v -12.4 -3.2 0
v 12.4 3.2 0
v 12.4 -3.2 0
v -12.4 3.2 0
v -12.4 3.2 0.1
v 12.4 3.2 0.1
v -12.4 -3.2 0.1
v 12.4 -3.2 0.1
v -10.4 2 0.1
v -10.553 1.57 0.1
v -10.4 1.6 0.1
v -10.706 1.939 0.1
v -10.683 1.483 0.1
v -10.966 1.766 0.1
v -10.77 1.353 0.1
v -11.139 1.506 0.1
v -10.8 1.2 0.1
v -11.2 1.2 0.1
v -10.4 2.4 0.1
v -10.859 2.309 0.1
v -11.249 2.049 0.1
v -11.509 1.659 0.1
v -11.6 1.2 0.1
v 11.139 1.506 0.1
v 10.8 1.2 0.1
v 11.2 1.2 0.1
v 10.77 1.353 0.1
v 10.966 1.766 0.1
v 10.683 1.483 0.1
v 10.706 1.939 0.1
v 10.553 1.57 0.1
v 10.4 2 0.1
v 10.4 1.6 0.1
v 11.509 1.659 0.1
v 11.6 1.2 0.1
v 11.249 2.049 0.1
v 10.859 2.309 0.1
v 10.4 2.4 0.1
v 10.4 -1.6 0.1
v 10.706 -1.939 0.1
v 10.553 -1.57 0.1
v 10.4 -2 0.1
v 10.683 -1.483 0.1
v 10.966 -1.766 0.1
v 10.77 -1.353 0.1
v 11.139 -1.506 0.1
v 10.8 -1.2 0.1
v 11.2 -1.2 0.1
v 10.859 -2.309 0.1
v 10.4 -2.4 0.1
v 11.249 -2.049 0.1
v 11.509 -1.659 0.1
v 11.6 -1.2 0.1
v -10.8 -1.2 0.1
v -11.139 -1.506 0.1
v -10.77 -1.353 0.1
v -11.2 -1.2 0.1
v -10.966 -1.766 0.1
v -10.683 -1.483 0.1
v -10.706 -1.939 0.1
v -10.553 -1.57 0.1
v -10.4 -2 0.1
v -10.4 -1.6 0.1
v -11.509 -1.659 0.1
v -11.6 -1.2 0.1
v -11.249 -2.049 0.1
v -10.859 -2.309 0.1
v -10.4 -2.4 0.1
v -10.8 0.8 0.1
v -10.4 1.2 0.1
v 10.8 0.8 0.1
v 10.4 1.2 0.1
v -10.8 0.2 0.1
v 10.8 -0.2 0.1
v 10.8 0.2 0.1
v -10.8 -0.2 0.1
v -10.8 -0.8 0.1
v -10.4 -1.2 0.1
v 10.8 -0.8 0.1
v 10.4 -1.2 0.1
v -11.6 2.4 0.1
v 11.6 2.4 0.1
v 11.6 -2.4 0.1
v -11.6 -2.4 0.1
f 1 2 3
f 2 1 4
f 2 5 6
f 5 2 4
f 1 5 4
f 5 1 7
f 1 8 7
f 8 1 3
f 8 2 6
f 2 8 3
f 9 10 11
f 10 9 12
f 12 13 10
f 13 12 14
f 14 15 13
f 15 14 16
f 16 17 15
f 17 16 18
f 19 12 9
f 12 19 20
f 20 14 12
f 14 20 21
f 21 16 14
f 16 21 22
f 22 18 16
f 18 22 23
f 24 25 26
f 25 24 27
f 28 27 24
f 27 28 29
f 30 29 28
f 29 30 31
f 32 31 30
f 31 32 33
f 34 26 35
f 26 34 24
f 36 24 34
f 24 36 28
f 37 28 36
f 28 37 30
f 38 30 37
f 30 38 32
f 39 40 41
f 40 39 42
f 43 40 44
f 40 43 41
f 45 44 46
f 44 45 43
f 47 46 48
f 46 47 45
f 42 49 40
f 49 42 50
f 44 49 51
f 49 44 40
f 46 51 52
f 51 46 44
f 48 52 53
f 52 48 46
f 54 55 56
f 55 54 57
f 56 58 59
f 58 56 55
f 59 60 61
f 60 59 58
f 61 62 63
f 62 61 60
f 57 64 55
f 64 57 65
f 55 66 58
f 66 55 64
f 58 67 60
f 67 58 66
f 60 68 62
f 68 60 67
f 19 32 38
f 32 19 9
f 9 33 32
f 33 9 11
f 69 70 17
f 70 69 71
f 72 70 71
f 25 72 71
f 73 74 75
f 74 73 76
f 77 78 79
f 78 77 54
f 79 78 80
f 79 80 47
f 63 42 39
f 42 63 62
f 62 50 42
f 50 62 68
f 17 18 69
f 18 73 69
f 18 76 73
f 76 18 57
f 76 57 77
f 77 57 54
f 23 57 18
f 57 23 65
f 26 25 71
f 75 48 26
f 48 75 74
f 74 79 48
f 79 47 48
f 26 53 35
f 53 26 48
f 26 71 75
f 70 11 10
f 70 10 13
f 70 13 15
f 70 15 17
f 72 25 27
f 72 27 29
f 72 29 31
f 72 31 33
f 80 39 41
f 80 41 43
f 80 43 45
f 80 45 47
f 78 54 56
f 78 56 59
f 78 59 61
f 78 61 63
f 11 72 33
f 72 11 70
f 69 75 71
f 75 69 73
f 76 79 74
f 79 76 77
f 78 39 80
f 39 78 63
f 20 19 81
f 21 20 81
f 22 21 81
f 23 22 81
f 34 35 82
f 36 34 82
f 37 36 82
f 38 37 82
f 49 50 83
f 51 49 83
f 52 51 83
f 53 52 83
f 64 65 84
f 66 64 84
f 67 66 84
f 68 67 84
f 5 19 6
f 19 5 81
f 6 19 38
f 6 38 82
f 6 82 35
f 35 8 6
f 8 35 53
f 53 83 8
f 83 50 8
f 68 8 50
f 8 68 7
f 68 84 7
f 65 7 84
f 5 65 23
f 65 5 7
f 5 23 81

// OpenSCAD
// file: ../p/box5-12.scad
use <../lib.scad>
function ldraw_lib__box5_12() = [
// 0 Box with 5 Faces without Any Edges
// 0 Name: box5-12.dat
// 0 Author: Chris Dee [cwdee]
// 0 !LDRAW_ORG Primitive UPDATE 2009-02
// 0 !LICENSE Licensed under CC BY 2.0 and CC BY 4.0 : see CAreadme.txt
// 
// 0 BFC CERTIFY CCW
  [0,"BFC","CERTIFY"],
  [0,"BFC","CCW"],
// 
// 0 !HISTORY 2009-09-03 [PTadmin] Official Update 2009-02
// 
// 
// 4 16 1 1 1 1 1 -1 -1 1 -1 -1 1 1
  [4,16,1,1,1,1,1,-1,-1,1,-1,-1,1,1],
// 4 16 -1 0 1 1 0 1 1 1 1 -1 1 1
  [4,16,-1,0,1,1,0,1,1,1,1,-1,1,1],
// 4 16 -1 0 -1 -1 0 1 -1 1 1 -1 1 -1
  [4,16,-1,0,-1,-1,0,1,-1,1,1,-1,1,-1],
// 4 16 1 0 -1 -1 0 -1 -1 1 -1 1 1 -1
  [4,16,1,0,-1,-1,0,-1,-1,1,-1,1,1,-1],
// 4 16 1 0 1 1 0 -1 1 1 -1 1 1 1
  [4,16,1,0,1,1,0,-1,1,1,-1,1,1,1],
// 0
];
makepoly(ldraw_lib__box5_12(), line=0.2);
// file: ../p/1-4ring2.scad
use <../lib.scad>
function ldraw_lib__1_4ring2() = [
// 0 Ring  2 x 0.25
// 0 Name: 1-4ring2.dat
// 0 Author: Franklin W. Cain [fwcain]
// 0 !LDRAW_ORG Primitive UPDATE 2015-01
// 0 !LICENSE Licensed under CC BY 2.0 and CC BY 4.0 : see CAreadme.txt
// 
// 0 BFC CERTIFY CCW
  [0,"BFC","CERTIFY"],
  [0,"BFC","CCW"],
// 
// 0 !HISTORY 2001-12-31 [PTadmin] Official Update 2001-03
// 0 !HISTORY 2007-06-22 [PTadmin] Header formatted for Contributor Agreement
// 0 !HISTORY 2008-07-01 [PTadmin] Official Update 2008-01
// 0 !HISTORY 2012-02-16 [Philo] Changed to CCW
// 0 !HISTORY 2012-03-30 [PTadmin] Official Update 2012-01
// 0 !HISTORY 2014-12-25 [MMR1988] Fixed a rounding issue
// 0 !HISTORY 2015-10-11 [PTadmin] Official Update 2015-01
// 
// 
// 4 16 3 0 0 2.7717 0 1.1481 1.8478 0 0.7654 2 0 0
  [4,16,3,0,0,2.7717,0,1.1481,1.8478,0,0.7654,2,0,0],
// 4 16 2.7717 0 1.1481 2.1213 0 2.1213 1.4142 0 1.4142 1.8478 0 0.7654
  [4,16,2.7717,0,1.1481,2.1213,0,2.1213,1.4142,0,1.4142,1.8478,0,0.7654],
// 4 16 2.1213 0 2.1213 1.1481 0 2.7717 0.7654 0 1.8478 1.4142 0 1.4142
  [4,16,2.1213,0,2.1213,1.1481,0,2.7717,0.7654,0,1.8478,1.4142,0,1.4142],
// 4 16 1.1481 0 2.7717 0 0 3 0 0 2 0.7654 0 1.8478
  [4,16,1.1481,0,2.7717,0,0,3,0,0,2,0.7654,0,1.8478],
// 0 // Build by Primitive Generator 2
];
makepoly(ldraw_lib__1_4ring2(), line=0.2);
// file: ../p/1-4ring1.scad
use <../lib.scad>
function ldraw_lib__1_4ring1() = [
// 0 Ring  1 x 0.25
// 0 Name: 1-4ring1.dat
// 0 Author: Chris Dee [cwdee]
// 0 !LDRAW_ORG Primitive UPDATE 2012-01
// 0 !LICENSE Licensed under CC BY 2.0 and CC BY 4.0 : see CAreadme.txt
// 
// 0 BFC CERTIFY CCW
  [0,"BFC","CERTIFY"],
  [0,"BFC","CCW"],
// 
// 0 !HISTORY 2000-05-07 [PTadmin] Official Update 2000-01
// 0 !HISTORY 2002-11-22 [hafhead] Added BFC statement
// 0 !HISTORY 2002-11-30 [PTadmin] Official Update 2002-05
// 0 !HISTORY 2007-06-22 [PTadmin] Header formatted for Contributor Agreement
// 0 !HISTORY 2008-07-01 [PTadmin] Official Update 2008-01
// 0 !HISTORY 2012-02-16 [Philo] Changed to CCW
// 0 !HISTORY 2012-03-30 [PTadmin] Official Update 2012-01
// 
// 
// 4 16 2 0 0 1.8478 0 0.7654 0.9239 0 0.3827 1 0 0
  [4,16,2,0,0,1.8478,0,0.7654,0.9239,0,0.3827,1,0,0],
// 4 16 1.8478 0 0.7654 1.4142 0 1.4142 0.7071 0 0.7071 0.9239 0 0.3827
  [4,16,1.8478,0,0.7654,1.4142,0,1.4142,0.7071,0,0.7071,0.9239,0,0.3827],
// 4 16 1.4142 0 1.4142 0.7654 0 1.8478 0.3827 0 0.9239 0.7071 0 0.7071
  [4,16,1.4142,0,1.4142,0.7654,0,1.8478,0.3827,0,0.9239,0.7071,0,0.7071],
// 4 16 0.7654 0 1.8478 0 0 2 0 0 1 0.3827 0 0.9239
  [4,16,0.7654,0,1.8478,0,0,2,0,0,1,0.3827,0,0.9239],
];
makepoly(ldraw_lib__1_4ring1(), line=0.2);
// file: ../p/1-4ndis.scad
use <../lib.scad>
function ldraw_lib__1_4ndis() = [
// 0 Disc Negative 0.25
// 0 Name: 1-4ndis.dat
// 0 Author: James Jessiman
// 0 !LDRAW_ORG Primitive UPDATE 2012-01
// 0 !LICENSE Licensed under CC BY 2.0 and CC BY 4.0 : see CAreadme.txt
// 
// 0 BFC CERTIFY CCW
  [0,"BFC","CERTIFY"],
  [0,"BFC","CCW"],
// 
// 0 !HISTORY 2002-03-23 [sbliss] Added BFC Statement
// 0 !HISTORY 2002-04-25 [PTadmin] Official Update 2002-02
// 0 !HISTORY 2007-06-22 [PTadmin] Header formatted for Contributor Agreement
// 0 !HISTORY 2008-07-01 [PTadmin] Official Update 2008-01
// 0 !HISTORY 2012-02-16 [Philo] Changed to CCW
// 0 !HISTORY 2012-03-30 [PTadmin] Official Update 2012-01
// 
// 
// 3 16 0.9239 0 0.3827 1 0 0 1 0 1
  [3,16,0.9239,0,0.3827,1,0,0,1,0,1],
// 3 16 0.7071 0 0.7071 0.9239 0 0.3827 1 0 1
  [3,16,0.7071,0,0.7071,0.9239,0,0.3827,1,0,1],
// 3 16 0.3827 0 0.9239 0.7071 0 0.7071 1 0 1
  [3,16,0.3827,0,0.9239,0.7071,0,0.7071,1,0,1],
// 3 16 0 0 1 0.3827 0 0.9239 1 0 1
  [3,16,0,0,1,0.3827,0,0.9239,1,0,1],
];
makepoly(ldraw_lib__1_4ndis(), line=0.2);
// file: ../p/1-4disc.scad
use <../lib.scad>
function ldraw_lib__1_4disc() = [
// 0 Disc 0.25
// 0 Name: 1-4disc.dat
// 0 Author: James Jessiman
// 0 !LDRAW_ORG Primitive UPDATE 2002-02
// 0 !LICENSE Licensed under CC BY 2.0 and CC BY 4.0 : see CAreadme.txt
// 
// 0 BFC CERTIFY CCW
  [0,"BFC","CERTIFY"],
  [0,"BFC","CCW"],
// 
// 0 !HISTORY 2002-03-23 [sbliss] Added BFC statement.
// 0 !HISTORY 2002-04-25 [PTadmin] Official Update 2002-02
// 0 !HISTORY 2007-06-22 [PTadmin] Header formatted for Contributor Agreement
// 0 !HISTORY 2008-07-01 [PTadmin] Official Update 2008-01
// 
// 
// 3 16 0 0 0 1 0 0 0.9239 0 0.3827
  [3,16,0,0,0,1,0,0,0.9239,0,0.3827],
// 3 16 0 0 0 0.9239 0 0.3827 0.7071 0 0.7071
  [3,16,0,0,0,0.9239,0,0.3827,0.7071,0,0.7071],
// 3 16 0 0 0 0.7071 0 0.7071 0.3827 0 0.9239
  [3,16,0,0,0,0.7071,0,0.7071,0.3827,0,0.9239],
// 3 16 0 0 0 0.3827 0 0.9239 0 0 1
  [3,16,0,0,0,0.3827,0,0.9239,0,0,1],
// 0
];
makepoly(ldraw_lib__1_4disc(), line=0.2);
// main file
use <../lib.scad>
use <../p/1-4disc.scad>
use <../p/1-4ndis.scad>
use <../p/1-4ring1.scad>
use <../p/1-4ring2.scad>
use <../p/box5-12.scad>
function ldraw_lib__4100418f() = [
// 0 Sticker  0.8 x  3.1 with Horizontal Grille
// 0 Name: 4100418f.dat
// 0 Author: J.C. Tchang [tchang]
// 0 !LDRAW_ORG Part UPDATE 2013-01
// 0 !LICENSE Licensed under CC BY 2.0 and CC BY 4.0 : see CAreadme.txt
// 
// 0 BFC CERTIFY CCW
  [0,"BFC","CERTIFY"],
  [0,"BFC","CCW"],
// 
// 0 !KEYWORDS Set 5571
// 
// 0 !HISTORY 2013-07-21 [PTadmin] Official Update 2013-01
// 
// 
// 1 16 0 -0.25 0 31 0 0 0 0.25 0 0 0 8 box5-12.dat
  [1,16,0,-0.25,0,31,0,0,0,0.25,0,0,0,8, ldraw_lib__box5_12()],
// 0 //
// 1 0 -26 -0.25 3 0 0 -1 0 1 0 1 0 0 1-4ring1.dat
  [1,0,-26,-0.25,3,0,0,-1,0,1,0,1,0,0, ldraw_lib__1_4ring1()],
// 1 0 -26 -0.25 3 0 0 -1 0 1 0 1 0 0 1-4ring2.dat
  [1,0,-26,-0.25,3,0,0,-1,0,1,0,1,0,0, ldraw_lib__1_4ring2()],
// 1 0 26 -0.25 3 1 0 0 0 1 0 0 0 1 1-4ring1.dat
  [1,0,26,-0.25,3,1,0,0,0,1,0,0,0,1, ldraw_lib__1_4ring1()],
// 1 0 26 -0.25 3 1 0 0 0 1 0 0 0 1 1-4ring2.dat
  [1,0,26,-0.25,3,1,0,0,0,1,0,0,0,1, ldraw_lib__1_4ring2()],
// 1 0 26 -0.25 -3 0 0 1 0 1 0 -1 0 0 1-4ring1.dat
  [1,0,26,-0.25,-3,0,0,1,0,1,0,-1,0,0, ldraw_lib__1_4ring1()],
// 1 0 26 -0.25 -3 0 0 1 0 1 0 -1 0 0 1-4ring2.dat
  [1,0,26,-0.25,-3,0,0,1,0,1,0,-1,0,0, ldraw_lib__1_4ring2()],
// 1 0 -26 -0.25 -3 -1 0 0 0 1 0 0 0 -1 1-4ring1.dat
  [1,0,-26,-0.25,-3,-1,0,0,0,1,0,0,0,-1, ldraw_lib__1_4ring1()],
// 1 0 -26 -0.25 -3 -1 0 0 0 1 0 0 0 -1 1-4ring2.dat
  [1,0,-26,-0.25,-3,-1,0,0,0,1,0,0,0,-1, ldraw_lib__1_4ring2()],
// 4 0 26 -0.25 5 26 -0.25 6 -26 -0.25 6 -26 -0.25 5
  [4,0,26,-0.25,5,26,-0.25,6,-26,-0.25,6,-26,-0.25,5],
// 4 0 26 -0.25 4 26 -0.25 5 -26 -0.25 5 -26 -0.25 4
  [4,0,26,-0.25,4,26,-0.25,5,-26,-0.25,5,-26,-0.25,4],
// 4 0 -26 -0.25 3 -27 -0.25 3 -27 -0.25 2 27 -0.25 2
  [4,0,-26,-0.25,3,-27,-0.25,3,-27,-0.25,2,27,-0.25,2],
// 3 0 26 -0.25 3 -26 -0.25 3 27 -0.25 2
  [3,0,26,-0.25,3,-26,-0.25,3,27,-0.25,2],
// 3 0 27 -0.25 3 26 -0.25 3 27 -0.25 2
  [3,0,27,-0.25,3,26,-0.25,3,27,-0.25,2],
// 4 0 27 -0.25 0.5 -27 -0.25 0.5 -27 -0.25 -0.5 27 -0.25 -0.5
  [4,0,27,-0.25,0.5,-27,-0.25,0.5,-27,-0.25,-0.5,27,-0.25,-0.5],
// 4 0 -27 -0.25 -2 -27 -0.25 -3 -26 -0.25 -3 27 -0.25 -2
  [4,0,-27,-0.25,-2,-27,-0.25,-3,-26,-0.25,-3,27,-0.25,-2],
// 3 0 27 -0.25 -2 -26 -0.25 -3 26 -0.25 -3
  [3,0,27,-0.25,-2,-26,-0.25,-3,26,-0.25,-3],
// 3 0 27 -0.25 -2 26 -0.25 -3 27 -0.25 -3
  [3,0,27,-0.25,-2,26,-0.25,-3,27,-0.25,-3],
// 4 0 26 -0.25 -4 -26 -0.25 -4 -26 -0.25 -5 26 -0.25 -5
  [4,0,26,-0.25,-4,-26,-0.25,-4,-26,-0.25,-5,26,-0.25,-5],
// 4 0 26 -0.25 -5 -26 -0.25 -5 -26 -0.25 -6 26 -0.25 -6
  [4,0,26,-0.25,-5,-26,-0.25,-5,-26,-0.25,-6,26,-0.25,-6],
// 3 0 -27 -0.25 3 -28 -0.25 3 -27 -0.25 2
  [3,0,-27,-0.25,3,-28,-0.25,3,-27,-0.25,2],
// 3 0 -28 -0.25 3 -27 -0.25 0.5 -27 -0.25 2
  [3,0,-28,-0.25,3,-27,-0.25,0.5,-27,-0.25,2],
// 4 0 -27 -0.25 -0.5 -27 -0.25 0.5 -28 -0.25 3 -28 -0.25 -3
  [4,0,-27,-0.25,-0.5,-27,-0.25,0.5,-28,-0.25,3,-28,-0.25,-3],
// 3 0 -27 -0.25 -0.5 -28 -0.25 -3 -27 -0.25 -2
  [3,0,-27,-0.25,-0.5,-28,-0.25,-3,-27,-0.25,-2],
// 3 0 -27 -0.25 -2 -28 -0.25 -3 -27 -0.25 -3
  [3,0,-27,-0.25,-2,-28,-0.25,-3,-27,-0.25,-3],
// 4 0 -29 -0.25 -3 -28 -0.25 -3 -28 -0.25 3 -29 -0.25 3
  [4,0,-29,-0.25,-3,-28,-0.25,-3,-28,-0.25,3,-29,-0.25,3],
// 3 0 28 -0.25 3 27 -0.25 3 27 -0.25 2
  [3,0,28,-0.25,3,27,-0.25,3,27,-0.25,2],
// 4 0 28 -0.25 3 27 -0.25 0.5 27 -0.25 -0.5 28 -0.25 -3
  [4,0,28,-0.25,3,27,-0.25,0.5,27,-0.25,-0.5,28,-0.25,-3],
// 3 0 27 -0.25 -0.5 27 -0.25 -2 28 -0.25 -3
  [3,0,27,-0.25,-0.5,27,-0.25,-2,28,-0.25,-3],
// 3 0 27 -0.25 -2 27 -0.25 -3 28 -0.25 -3
  [3,0,27,-0.25,-2,27,-0.25,-3,28,-0.25,-3],
// 4 0 28 -0.25 3 28 -0.25 -3 29 -0.25 -3 29 -0.25 3
  [4,0,28,-0.25,3,28,-0.25,-3,29,-0.25,-3,29,-0.25,3],
// 3 0 28 -0.25 3 27 -0.25 2 27 -0.25 0.5
  [3,0,28,-0.25,3,27,-0.25,2,27,-0.25,0.5],
// 0 //
// 1 7 -26 -0.25 3 0 0 -1 0 1 0 1 0 0 1-4disc.dat
  [1,7,-26,-0.25,3,0,0,-1,0,1,0,1,0,0, ldraw_lib__1_4disc()],
// 1 7 26 -0.25 3 1 0 0 0 1 0 0 0 1 1-4disc.dat
  [1,7,26,-0.25,3,1,0,0,0,1,0,0,0,1, ldraw_lib__1_4disc()],
// 1 7 26 -0.25 -3 0 0 1 0 1 0 -1 0 0 1-4disc.dat
  [1,7,26,-0.25,-3,0,0,1,0,1,0,-1,0,0, ldraw_lib__1_4disc()],
// 1 7 -26 -0.25 -3 -1 0 0 0 1 0 0 0 -1 1-4disc.dat
  [1,7,-26,-0.25,-3,-1,0,0,0,1,0,0,0,-1, ldraw_lib__1_4disc()],
// 4 7 -26 -0.25 4 -26 -0.25 3 26 -0.25 3 26 -0.25 4
  [4,7,-26,-0.25,4,-26,-0.25,3,26,-0.25,3,26,-0.25,4],
// 4 7 27 -0.25 2 -27 -0.25 2 -27 -0.25 0.5 27 -0.25 0.5
  [4,7,27,-0.25,2,-27,-0.25,2,-27,-0.25,0.5,27,-0.25,0.5],
// 4 7 27 -0.25 -0.5 -27 -0.25 -0.5 -27 -0.25 -2 27 -0.25 -2
  [4,7,27,-0.25,-0.5,-27,-0.25,-0.5,-27,-0.25,-2,27,-0.25,-2],
// 4 7 -26 -0.25 -3 -26 -0.25 -4 26 -0.25 -4 26 -0.25 -3
  [4,7,-26,-0.25,-3,-26,-0.25,-4,26,-0.25,-4,26,-0.25,-3],
// 0 //
// 1 16 -26 -0.25 3 0 0 -3 0 1 0 3 0 0 1-4ndis.dat
  [1,16,-26,-0.25,3,0,0,-3,0,1,0,3,0,0, ldraw_lib__1_4ndis()],
// 1 16 26 -0.25 3 3 0 0 0 1 0 0 0 3 1-4ndis.dat
  [1,16,26,-0.25,3,3,0,0,0,1,0,0,0,3, ldraw_lib__1_4ndis()],
// 1 16 26 -0.25 -3 0 0 3 0 1 0 -3 0 0 1-4ndis.dat
  [1,16,26,-0.25,-3,0,0,3,0,1,0,-3,0,0, ldraw_lib__1_4ndis()],
// 1 16 -26 -0.25 -3 -3 0 0 0 1 0 0 0 -3 1-4ndis.dat
  [1,16,-26,-0.25,-3,-3,0,0,0,1,0,0,0,-3, ldraw_lib__1_4ndis()],
// 4 16 -31 -0.25 8 -29 -0.25 6 -26 -0.25 6 31 -0.25 8
  [4,16,-31,-0.25,8,-29,-0.25,6,-26,-0.25,6,31,-0.25,8],
// 3 16 31 -0.25 8 -26 -0.25 6 26 -0.25 6
  [3,16,31,-0.25,8,-26,-0.25,6,26,-0.25,6],
// 3 16 31 -0.25 8 26 -0.25 6 29 -0.25 6
  [3,16,31,-0.25,8,26,-0.25,6,29,-0.25,6],
// 3 16 31 -0.25 8 29 -0.25 6 29 -0.25 3
  [3,16,31,-0.25,8,29,-0.25,6,29,-0.25,3],
// 4 16 31 -0.25 8 29 -0.25 3 29 -0.25 -3 31 -0.25 -8
  [4,16,31,-0.25,8,29,-0.25,3,29,-0.25,-3,31,-0.25,-8],
// 3 16 29 -0.25 -3 29 -0.25 -6 31 -0.25 -8
  [3,16,29,-0.25,-3,29,-0.25,-6,31,-0.25,-8],
// 3 16 29 -0.25 -6 26 -0.25 -6 31 -0.25 -8
  [3,16,29,-0.25,-6,26,-0.25,-6,31,-0.25,-8],
// 4 16 31 -0.25 -8 26 -0.25 -6 -26 -0.25 -6 -31 -0.25 -8
  [4,16,31,-0.25,-8,26,-0.25,-6,-26,-0.25,-6,-31,-0.25,-8],
// 3 16 -26 -0.25 -6 -29 -0.25 -6 -31 -0.25 -8
  [3,16,-26,-0.25,-6,-29,-0.25,-6,-31,-0.25,-8],
// 3 16 -29 -0.25 -3 -31 -0.25 -8 -29 -0.25 -6
  [3,16,-29,-0.25,-3,-31,-0.25,-8,-29,-0.25,-6],
// 4 16 -31 -0.25 -8 -29 -0.25 -3 -29 -0.25 3 -31 -0.25 8
  [4,16,-31,-0.25,-8,-29,-0.25,-3,-29,-0.25,3,-31,-0.25,8],
// 3 16 -31 -0.25 8 -29 -0.25 3 -29 -0.25 6
  [3,16,-31,-0.25,8,-29,-0.25,3,-29,-0.25,6],
];
makepoly(ldraw_lib__4100418f(), line=0.2);
